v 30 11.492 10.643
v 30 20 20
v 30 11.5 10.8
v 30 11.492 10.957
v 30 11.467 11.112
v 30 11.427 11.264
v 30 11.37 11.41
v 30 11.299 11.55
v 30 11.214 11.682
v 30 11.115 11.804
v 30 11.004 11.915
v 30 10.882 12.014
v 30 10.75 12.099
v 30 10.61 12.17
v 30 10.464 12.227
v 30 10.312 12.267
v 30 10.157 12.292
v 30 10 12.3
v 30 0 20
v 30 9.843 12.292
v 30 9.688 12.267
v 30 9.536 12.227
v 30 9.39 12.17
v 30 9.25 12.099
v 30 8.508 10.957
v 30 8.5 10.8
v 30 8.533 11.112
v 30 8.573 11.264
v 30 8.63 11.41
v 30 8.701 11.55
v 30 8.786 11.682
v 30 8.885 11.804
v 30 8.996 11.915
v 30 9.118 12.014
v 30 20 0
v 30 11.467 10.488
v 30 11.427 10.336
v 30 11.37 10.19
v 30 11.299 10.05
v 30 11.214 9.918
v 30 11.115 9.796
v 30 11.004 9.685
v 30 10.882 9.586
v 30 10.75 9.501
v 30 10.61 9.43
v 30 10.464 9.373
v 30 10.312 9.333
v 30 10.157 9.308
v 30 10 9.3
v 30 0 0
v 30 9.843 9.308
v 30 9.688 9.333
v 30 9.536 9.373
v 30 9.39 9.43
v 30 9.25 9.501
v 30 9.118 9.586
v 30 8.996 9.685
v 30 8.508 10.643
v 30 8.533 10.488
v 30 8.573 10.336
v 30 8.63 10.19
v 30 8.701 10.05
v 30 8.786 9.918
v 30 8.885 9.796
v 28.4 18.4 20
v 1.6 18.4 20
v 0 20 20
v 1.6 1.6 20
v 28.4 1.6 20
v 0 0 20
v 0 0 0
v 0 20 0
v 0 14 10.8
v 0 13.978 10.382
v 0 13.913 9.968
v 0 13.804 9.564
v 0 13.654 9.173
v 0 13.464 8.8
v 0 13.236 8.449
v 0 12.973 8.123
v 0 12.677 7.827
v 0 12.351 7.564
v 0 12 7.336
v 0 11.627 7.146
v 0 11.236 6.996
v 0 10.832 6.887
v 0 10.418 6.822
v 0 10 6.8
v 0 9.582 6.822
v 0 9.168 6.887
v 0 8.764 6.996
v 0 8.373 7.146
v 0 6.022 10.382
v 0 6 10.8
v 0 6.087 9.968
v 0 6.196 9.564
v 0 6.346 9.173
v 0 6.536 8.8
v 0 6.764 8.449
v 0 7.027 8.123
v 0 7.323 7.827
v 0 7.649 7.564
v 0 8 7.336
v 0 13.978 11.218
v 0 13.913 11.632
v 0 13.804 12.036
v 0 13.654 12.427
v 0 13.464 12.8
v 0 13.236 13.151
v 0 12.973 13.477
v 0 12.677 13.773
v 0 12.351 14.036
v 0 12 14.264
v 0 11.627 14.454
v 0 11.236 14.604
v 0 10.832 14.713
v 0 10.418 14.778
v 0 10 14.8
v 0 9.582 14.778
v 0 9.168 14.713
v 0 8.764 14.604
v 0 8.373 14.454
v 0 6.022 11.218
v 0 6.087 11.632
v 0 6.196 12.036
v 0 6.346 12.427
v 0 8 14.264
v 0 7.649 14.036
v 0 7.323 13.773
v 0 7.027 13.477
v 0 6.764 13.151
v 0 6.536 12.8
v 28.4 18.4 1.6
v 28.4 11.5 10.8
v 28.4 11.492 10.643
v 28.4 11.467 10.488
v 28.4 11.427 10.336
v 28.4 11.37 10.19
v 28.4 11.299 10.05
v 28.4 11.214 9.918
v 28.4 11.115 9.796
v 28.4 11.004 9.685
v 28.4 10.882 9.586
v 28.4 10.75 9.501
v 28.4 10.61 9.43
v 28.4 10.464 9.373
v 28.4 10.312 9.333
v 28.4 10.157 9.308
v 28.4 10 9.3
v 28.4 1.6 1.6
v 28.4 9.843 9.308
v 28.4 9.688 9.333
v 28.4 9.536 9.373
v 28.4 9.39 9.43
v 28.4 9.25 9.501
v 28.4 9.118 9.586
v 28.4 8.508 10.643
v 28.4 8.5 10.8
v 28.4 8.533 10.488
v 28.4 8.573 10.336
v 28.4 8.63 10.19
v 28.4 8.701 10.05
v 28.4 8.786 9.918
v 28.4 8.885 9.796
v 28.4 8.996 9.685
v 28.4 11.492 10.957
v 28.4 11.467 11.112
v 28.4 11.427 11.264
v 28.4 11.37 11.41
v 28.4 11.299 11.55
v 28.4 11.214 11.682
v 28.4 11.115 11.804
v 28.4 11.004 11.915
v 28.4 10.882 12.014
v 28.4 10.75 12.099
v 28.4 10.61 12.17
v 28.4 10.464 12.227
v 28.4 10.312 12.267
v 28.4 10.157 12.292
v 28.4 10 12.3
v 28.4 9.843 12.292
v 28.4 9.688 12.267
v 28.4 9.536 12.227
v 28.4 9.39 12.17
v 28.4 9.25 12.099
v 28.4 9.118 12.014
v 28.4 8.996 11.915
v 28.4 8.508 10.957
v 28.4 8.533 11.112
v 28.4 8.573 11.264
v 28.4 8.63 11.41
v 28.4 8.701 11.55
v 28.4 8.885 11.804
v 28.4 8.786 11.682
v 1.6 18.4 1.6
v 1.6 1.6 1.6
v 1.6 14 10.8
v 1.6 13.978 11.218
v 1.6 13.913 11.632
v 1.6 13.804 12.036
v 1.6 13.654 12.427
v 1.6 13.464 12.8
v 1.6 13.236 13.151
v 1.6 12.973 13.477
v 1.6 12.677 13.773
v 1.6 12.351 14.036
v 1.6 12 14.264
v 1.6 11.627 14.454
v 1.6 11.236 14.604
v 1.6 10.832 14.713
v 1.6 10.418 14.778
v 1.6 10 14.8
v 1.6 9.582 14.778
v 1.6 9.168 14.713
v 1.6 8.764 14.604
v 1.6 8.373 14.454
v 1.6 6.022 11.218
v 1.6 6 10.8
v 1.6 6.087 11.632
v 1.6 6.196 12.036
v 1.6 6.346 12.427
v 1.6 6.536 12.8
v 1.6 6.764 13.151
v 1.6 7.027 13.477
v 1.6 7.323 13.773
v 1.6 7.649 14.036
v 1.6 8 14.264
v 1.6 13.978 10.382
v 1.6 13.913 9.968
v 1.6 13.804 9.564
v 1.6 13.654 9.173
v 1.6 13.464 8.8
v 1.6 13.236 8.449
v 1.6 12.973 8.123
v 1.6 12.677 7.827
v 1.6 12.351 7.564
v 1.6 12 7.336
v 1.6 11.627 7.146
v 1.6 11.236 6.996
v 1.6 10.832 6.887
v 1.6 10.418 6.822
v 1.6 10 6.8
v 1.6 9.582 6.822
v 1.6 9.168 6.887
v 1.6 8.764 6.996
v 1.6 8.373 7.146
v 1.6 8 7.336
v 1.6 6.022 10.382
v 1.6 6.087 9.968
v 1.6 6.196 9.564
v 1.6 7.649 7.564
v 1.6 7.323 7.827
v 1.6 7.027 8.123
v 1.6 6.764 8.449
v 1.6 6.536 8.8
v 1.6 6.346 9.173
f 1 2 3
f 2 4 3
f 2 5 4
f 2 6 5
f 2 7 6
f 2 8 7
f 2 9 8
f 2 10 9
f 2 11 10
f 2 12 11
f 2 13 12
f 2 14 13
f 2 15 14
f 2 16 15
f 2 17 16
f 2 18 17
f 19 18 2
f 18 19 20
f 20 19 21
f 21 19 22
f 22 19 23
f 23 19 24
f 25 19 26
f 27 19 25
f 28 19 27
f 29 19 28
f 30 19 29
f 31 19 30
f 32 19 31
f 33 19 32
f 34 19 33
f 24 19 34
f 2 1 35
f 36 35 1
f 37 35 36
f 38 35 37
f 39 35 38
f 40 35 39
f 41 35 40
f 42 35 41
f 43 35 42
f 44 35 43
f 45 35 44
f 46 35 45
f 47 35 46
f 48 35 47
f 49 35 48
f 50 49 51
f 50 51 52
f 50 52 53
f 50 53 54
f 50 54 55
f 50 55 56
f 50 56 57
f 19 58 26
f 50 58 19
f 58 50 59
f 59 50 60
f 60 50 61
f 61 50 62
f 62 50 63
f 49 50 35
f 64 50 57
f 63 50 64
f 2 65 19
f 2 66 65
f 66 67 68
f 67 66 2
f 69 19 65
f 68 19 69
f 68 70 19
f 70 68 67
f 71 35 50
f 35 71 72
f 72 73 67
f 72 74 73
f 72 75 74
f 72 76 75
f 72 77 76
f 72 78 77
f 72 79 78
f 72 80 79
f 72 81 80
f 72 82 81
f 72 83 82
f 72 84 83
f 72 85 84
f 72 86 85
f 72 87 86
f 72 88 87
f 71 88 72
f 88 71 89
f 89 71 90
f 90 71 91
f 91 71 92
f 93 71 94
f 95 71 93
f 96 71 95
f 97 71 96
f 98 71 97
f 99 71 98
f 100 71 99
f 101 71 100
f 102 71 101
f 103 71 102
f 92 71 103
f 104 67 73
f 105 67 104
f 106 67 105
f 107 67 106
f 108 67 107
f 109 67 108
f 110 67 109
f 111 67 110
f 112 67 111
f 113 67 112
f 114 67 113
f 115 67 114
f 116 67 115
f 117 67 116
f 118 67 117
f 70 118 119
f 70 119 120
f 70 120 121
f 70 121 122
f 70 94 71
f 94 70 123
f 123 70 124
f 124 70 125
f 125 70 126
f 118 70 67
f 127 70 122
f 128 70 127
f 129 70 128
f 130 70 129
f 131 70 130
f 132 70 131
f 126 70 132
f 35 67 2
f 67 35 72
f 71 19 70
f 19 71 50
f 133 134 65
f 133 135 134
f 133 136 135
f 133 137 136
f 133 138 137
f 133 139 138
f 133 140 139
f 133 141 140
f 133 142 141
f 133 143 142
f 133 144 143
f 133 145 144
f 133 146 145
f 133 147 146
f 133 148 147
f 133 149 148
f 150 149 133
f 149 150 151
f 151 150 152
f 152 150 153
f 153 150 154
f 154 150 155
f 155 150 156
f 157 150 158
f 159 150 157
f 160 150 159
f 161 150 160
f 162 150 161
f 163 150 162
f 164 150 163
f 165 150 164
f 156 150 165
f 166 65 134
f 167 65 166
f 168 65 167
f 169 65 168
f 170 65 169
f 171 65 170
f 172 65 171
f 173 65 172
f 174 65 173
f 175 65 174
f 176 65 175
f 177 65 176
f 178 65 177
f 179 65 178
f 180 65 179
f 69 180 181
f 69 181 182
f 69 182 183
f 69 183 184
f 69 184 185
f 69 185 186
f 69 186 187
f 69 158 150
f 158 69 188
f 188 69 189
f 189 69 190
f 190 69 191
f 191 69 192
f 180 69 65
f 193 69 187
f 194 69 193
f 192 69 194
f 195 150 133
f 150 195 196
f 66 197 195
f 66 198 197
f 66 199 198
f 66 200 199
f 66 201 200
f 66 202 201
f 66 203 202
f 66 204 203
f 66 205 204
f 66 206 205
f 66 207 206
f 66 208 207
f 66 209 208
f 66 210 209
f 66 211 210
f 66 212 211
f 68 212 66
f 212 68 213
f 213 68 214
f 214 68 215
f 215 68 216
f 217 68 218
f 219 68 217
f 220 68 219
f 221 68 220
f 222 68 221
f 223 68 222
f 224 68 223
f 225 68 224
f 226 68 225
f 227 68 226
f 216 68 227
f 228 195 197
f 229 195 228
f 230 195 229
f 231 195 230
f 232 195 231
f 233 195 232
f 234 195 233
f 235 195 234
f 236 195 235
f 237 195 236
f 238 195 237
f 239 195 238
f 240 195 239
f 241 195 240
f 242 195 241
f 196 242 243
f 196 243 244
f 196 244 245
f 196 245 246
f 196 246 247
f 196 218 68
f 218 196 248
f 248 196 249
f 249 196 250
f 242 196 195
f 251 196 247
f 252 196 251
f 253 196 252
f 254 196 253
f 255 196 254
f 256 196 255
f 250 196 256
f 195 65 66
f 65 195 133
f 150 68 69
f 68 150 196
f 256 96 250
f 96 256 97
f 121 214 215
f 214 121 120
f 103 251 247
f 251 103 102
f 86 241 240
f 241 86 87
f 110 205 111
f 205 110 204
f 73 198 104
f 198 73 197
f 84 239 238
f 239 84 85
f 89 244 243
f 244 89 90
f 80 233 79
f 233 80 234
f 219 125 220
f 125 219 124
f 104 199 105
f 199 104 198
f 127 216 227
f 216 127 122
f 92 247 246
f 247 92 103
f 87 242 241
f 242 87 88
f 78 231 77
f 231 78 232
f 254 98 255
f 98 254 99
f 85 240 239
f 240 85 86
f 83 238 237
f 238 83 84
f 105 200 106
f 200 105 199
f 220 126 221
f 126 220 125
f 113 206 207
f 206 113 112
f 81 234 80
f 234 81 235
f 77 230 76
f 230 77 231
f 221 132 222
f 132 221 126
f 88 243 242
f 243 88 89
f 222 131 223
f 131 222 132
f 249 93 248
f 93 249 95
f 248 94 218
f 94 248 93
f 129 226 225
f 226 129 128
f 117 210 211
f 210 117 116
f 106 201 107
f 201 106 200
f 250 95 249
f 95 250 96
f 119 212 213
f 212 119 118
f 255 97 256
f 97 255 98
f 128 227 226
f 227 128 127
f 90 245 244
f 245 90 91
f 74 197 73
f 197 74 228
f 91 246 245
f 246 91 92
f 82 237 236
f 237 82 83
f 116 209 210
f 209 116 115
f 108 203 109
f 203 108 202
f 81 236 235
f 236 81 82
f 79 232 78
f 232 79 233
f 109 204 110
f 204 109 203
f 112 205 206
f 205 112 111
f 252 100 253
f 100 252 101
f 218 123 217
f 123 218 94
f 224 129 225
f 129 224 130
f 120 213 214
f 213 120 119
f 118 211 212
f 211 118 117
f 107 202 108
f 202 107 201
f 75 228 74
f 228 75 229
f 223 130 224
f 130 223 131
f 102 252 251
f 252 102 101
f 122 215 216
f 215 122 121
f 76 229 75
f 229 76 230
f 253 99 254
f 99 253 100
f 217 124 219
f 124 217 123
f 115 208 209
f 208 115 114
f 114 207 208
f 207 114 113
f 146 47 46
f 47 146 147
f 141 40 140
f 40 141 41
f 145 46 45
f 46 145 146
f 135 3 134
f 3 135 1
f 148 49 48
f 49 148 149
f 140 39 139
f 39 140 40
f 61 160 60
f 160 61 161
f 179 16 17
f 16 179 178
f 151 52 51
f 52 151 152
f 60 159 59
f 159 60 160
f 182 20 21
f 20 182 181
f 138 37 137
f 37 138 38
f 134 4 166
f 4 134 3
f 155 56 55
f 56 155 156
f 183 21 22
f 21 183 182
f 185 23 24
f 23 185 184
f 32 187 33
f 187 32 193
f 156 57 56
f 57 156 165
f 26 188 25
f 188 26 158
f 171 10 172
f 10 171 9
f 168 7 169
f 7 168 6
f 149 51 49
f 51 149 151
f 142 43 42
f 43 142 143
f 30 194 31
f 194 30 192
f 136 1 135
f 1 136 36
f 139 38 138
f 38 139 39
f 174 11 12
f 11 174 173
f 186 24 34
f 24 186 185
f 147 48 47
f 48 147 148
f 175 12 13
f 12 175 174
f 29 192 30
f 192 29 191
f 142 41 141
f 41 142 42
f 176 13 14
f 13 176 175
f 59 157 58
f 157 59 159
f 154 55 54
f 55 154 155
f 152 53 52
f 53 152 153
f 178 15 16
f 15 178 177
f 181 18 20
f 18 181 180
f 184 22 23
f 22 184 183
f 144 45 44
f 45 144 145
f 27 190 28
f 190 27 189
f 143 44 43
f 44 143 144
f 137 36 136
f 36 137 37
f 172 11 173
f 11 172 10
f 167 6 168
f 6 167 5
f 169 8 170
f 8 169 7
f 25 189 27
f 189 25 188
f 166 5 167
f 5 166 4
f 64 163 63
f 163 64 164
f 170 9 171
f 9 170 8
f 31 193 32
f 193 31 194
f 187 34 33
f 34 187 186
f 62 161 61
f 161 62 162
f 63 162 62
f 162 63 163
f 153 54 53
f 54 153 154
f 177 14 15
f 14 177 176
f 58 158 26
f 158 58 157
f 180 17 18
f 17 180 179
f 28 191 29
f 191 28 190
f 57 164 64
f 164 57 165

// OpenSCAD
// --- EINSTELLUNGEN ---

// Was soll angezeigt werden? "gehaeuse" oder "deckel"
teil_anzeigen = "gehaeuse"; 

// Maße des Gehäuses (Außen)
laenge = 30;
breite = 20;
hoehe  = 20;

// Wandstärke
wand = 1.6; // 1.6mm ist gut für 3D Druck (4 Bahnen à 0.4mm)

// Bohrungen
loch_cinch = 8.00;
loch_kabel = 3.0;

// Toleranz für den Deckel (Spaltmaß)
// 0.15mm bis 0.2mm ist meist gut für einen festen Klemmsitz
toleranz = 0.2; 

// Qualität der Rundungen
$fn = 60; 

// --- LOGIK ---

if (teil_anzeigen == "gehaeuse") {
    gehaeuse();
} else if (teil_anzeigen == "deckel") {
    deckel();
} else {
    // Falls man beide sehen will zur Vorschau
    gehaeuse();
    translate([0, 0, hoehe + 5]) deckel();
}

// --- MODULE ---

module gehaeuse() {
    difference() {
        // 1. Der massive Block
        cube([laenge, breite, hoehe]);
        
        // 2. Der Innenraum (Schnitt)
        // Wir lassen oben offen (Z-Richtung)
        translate([wand, wand, wand]) {
            cube([laenge - 2*wand, breite - 2*wand, hoehe]);
        }
        
        // 3. Cinch Bohrung (7.75mm)
        // Positioniert an der linken Seite (X=0)
        translate([-1, breite/2, (hoehe/2) + (wand/2)]) {
            rotate([0, 90, 0]) {
                cylinder(d=loch_cinch, h=wand+2);
            }
        }
        
        // 4. Kabel Bohrung (2.5mm)
        // Positioniert an der gegenüberliegenden Seite (X=laenge)
        translate([laenge - wand - 1, breite/2, (hoehe/2) + (wand/2)]) {
            rotate([0, 90, 0]) {
                cylinder(d=loch_kabel, h=wand+2);
            }
        }
    }
}

module deckel() {
    // Die Deckplatte
    cube([laenge, breite, wand]);
    
    // Der Klemm-Rahmen (Steg, der in das Gehäuse greift)
    translate([wand + toleranz, wand + toleranz, wand]) {
        difference() {
            // Außenmaß des Stegs (Innenmaß Gehäuse minus Toleranz)
            cube([
                laenge - 2*(wand + toleranz), 
                breite - 2*(wand + toleranz), 
                3 // Der Steg ragt 3mm tief ins Gehäuse
            ]);
            
            // Innen hohl machen, um Material zu sparen und Flexibilität zu geben
            translate([wand, wand, -1]) {
                cube([
                    laenge - 2*(wand + toleranz) - 2*wand, 
                    breite - 2*(wand + toleranz) - 2*wand, 
                    5
                ]);
            }
        }
    }
}
